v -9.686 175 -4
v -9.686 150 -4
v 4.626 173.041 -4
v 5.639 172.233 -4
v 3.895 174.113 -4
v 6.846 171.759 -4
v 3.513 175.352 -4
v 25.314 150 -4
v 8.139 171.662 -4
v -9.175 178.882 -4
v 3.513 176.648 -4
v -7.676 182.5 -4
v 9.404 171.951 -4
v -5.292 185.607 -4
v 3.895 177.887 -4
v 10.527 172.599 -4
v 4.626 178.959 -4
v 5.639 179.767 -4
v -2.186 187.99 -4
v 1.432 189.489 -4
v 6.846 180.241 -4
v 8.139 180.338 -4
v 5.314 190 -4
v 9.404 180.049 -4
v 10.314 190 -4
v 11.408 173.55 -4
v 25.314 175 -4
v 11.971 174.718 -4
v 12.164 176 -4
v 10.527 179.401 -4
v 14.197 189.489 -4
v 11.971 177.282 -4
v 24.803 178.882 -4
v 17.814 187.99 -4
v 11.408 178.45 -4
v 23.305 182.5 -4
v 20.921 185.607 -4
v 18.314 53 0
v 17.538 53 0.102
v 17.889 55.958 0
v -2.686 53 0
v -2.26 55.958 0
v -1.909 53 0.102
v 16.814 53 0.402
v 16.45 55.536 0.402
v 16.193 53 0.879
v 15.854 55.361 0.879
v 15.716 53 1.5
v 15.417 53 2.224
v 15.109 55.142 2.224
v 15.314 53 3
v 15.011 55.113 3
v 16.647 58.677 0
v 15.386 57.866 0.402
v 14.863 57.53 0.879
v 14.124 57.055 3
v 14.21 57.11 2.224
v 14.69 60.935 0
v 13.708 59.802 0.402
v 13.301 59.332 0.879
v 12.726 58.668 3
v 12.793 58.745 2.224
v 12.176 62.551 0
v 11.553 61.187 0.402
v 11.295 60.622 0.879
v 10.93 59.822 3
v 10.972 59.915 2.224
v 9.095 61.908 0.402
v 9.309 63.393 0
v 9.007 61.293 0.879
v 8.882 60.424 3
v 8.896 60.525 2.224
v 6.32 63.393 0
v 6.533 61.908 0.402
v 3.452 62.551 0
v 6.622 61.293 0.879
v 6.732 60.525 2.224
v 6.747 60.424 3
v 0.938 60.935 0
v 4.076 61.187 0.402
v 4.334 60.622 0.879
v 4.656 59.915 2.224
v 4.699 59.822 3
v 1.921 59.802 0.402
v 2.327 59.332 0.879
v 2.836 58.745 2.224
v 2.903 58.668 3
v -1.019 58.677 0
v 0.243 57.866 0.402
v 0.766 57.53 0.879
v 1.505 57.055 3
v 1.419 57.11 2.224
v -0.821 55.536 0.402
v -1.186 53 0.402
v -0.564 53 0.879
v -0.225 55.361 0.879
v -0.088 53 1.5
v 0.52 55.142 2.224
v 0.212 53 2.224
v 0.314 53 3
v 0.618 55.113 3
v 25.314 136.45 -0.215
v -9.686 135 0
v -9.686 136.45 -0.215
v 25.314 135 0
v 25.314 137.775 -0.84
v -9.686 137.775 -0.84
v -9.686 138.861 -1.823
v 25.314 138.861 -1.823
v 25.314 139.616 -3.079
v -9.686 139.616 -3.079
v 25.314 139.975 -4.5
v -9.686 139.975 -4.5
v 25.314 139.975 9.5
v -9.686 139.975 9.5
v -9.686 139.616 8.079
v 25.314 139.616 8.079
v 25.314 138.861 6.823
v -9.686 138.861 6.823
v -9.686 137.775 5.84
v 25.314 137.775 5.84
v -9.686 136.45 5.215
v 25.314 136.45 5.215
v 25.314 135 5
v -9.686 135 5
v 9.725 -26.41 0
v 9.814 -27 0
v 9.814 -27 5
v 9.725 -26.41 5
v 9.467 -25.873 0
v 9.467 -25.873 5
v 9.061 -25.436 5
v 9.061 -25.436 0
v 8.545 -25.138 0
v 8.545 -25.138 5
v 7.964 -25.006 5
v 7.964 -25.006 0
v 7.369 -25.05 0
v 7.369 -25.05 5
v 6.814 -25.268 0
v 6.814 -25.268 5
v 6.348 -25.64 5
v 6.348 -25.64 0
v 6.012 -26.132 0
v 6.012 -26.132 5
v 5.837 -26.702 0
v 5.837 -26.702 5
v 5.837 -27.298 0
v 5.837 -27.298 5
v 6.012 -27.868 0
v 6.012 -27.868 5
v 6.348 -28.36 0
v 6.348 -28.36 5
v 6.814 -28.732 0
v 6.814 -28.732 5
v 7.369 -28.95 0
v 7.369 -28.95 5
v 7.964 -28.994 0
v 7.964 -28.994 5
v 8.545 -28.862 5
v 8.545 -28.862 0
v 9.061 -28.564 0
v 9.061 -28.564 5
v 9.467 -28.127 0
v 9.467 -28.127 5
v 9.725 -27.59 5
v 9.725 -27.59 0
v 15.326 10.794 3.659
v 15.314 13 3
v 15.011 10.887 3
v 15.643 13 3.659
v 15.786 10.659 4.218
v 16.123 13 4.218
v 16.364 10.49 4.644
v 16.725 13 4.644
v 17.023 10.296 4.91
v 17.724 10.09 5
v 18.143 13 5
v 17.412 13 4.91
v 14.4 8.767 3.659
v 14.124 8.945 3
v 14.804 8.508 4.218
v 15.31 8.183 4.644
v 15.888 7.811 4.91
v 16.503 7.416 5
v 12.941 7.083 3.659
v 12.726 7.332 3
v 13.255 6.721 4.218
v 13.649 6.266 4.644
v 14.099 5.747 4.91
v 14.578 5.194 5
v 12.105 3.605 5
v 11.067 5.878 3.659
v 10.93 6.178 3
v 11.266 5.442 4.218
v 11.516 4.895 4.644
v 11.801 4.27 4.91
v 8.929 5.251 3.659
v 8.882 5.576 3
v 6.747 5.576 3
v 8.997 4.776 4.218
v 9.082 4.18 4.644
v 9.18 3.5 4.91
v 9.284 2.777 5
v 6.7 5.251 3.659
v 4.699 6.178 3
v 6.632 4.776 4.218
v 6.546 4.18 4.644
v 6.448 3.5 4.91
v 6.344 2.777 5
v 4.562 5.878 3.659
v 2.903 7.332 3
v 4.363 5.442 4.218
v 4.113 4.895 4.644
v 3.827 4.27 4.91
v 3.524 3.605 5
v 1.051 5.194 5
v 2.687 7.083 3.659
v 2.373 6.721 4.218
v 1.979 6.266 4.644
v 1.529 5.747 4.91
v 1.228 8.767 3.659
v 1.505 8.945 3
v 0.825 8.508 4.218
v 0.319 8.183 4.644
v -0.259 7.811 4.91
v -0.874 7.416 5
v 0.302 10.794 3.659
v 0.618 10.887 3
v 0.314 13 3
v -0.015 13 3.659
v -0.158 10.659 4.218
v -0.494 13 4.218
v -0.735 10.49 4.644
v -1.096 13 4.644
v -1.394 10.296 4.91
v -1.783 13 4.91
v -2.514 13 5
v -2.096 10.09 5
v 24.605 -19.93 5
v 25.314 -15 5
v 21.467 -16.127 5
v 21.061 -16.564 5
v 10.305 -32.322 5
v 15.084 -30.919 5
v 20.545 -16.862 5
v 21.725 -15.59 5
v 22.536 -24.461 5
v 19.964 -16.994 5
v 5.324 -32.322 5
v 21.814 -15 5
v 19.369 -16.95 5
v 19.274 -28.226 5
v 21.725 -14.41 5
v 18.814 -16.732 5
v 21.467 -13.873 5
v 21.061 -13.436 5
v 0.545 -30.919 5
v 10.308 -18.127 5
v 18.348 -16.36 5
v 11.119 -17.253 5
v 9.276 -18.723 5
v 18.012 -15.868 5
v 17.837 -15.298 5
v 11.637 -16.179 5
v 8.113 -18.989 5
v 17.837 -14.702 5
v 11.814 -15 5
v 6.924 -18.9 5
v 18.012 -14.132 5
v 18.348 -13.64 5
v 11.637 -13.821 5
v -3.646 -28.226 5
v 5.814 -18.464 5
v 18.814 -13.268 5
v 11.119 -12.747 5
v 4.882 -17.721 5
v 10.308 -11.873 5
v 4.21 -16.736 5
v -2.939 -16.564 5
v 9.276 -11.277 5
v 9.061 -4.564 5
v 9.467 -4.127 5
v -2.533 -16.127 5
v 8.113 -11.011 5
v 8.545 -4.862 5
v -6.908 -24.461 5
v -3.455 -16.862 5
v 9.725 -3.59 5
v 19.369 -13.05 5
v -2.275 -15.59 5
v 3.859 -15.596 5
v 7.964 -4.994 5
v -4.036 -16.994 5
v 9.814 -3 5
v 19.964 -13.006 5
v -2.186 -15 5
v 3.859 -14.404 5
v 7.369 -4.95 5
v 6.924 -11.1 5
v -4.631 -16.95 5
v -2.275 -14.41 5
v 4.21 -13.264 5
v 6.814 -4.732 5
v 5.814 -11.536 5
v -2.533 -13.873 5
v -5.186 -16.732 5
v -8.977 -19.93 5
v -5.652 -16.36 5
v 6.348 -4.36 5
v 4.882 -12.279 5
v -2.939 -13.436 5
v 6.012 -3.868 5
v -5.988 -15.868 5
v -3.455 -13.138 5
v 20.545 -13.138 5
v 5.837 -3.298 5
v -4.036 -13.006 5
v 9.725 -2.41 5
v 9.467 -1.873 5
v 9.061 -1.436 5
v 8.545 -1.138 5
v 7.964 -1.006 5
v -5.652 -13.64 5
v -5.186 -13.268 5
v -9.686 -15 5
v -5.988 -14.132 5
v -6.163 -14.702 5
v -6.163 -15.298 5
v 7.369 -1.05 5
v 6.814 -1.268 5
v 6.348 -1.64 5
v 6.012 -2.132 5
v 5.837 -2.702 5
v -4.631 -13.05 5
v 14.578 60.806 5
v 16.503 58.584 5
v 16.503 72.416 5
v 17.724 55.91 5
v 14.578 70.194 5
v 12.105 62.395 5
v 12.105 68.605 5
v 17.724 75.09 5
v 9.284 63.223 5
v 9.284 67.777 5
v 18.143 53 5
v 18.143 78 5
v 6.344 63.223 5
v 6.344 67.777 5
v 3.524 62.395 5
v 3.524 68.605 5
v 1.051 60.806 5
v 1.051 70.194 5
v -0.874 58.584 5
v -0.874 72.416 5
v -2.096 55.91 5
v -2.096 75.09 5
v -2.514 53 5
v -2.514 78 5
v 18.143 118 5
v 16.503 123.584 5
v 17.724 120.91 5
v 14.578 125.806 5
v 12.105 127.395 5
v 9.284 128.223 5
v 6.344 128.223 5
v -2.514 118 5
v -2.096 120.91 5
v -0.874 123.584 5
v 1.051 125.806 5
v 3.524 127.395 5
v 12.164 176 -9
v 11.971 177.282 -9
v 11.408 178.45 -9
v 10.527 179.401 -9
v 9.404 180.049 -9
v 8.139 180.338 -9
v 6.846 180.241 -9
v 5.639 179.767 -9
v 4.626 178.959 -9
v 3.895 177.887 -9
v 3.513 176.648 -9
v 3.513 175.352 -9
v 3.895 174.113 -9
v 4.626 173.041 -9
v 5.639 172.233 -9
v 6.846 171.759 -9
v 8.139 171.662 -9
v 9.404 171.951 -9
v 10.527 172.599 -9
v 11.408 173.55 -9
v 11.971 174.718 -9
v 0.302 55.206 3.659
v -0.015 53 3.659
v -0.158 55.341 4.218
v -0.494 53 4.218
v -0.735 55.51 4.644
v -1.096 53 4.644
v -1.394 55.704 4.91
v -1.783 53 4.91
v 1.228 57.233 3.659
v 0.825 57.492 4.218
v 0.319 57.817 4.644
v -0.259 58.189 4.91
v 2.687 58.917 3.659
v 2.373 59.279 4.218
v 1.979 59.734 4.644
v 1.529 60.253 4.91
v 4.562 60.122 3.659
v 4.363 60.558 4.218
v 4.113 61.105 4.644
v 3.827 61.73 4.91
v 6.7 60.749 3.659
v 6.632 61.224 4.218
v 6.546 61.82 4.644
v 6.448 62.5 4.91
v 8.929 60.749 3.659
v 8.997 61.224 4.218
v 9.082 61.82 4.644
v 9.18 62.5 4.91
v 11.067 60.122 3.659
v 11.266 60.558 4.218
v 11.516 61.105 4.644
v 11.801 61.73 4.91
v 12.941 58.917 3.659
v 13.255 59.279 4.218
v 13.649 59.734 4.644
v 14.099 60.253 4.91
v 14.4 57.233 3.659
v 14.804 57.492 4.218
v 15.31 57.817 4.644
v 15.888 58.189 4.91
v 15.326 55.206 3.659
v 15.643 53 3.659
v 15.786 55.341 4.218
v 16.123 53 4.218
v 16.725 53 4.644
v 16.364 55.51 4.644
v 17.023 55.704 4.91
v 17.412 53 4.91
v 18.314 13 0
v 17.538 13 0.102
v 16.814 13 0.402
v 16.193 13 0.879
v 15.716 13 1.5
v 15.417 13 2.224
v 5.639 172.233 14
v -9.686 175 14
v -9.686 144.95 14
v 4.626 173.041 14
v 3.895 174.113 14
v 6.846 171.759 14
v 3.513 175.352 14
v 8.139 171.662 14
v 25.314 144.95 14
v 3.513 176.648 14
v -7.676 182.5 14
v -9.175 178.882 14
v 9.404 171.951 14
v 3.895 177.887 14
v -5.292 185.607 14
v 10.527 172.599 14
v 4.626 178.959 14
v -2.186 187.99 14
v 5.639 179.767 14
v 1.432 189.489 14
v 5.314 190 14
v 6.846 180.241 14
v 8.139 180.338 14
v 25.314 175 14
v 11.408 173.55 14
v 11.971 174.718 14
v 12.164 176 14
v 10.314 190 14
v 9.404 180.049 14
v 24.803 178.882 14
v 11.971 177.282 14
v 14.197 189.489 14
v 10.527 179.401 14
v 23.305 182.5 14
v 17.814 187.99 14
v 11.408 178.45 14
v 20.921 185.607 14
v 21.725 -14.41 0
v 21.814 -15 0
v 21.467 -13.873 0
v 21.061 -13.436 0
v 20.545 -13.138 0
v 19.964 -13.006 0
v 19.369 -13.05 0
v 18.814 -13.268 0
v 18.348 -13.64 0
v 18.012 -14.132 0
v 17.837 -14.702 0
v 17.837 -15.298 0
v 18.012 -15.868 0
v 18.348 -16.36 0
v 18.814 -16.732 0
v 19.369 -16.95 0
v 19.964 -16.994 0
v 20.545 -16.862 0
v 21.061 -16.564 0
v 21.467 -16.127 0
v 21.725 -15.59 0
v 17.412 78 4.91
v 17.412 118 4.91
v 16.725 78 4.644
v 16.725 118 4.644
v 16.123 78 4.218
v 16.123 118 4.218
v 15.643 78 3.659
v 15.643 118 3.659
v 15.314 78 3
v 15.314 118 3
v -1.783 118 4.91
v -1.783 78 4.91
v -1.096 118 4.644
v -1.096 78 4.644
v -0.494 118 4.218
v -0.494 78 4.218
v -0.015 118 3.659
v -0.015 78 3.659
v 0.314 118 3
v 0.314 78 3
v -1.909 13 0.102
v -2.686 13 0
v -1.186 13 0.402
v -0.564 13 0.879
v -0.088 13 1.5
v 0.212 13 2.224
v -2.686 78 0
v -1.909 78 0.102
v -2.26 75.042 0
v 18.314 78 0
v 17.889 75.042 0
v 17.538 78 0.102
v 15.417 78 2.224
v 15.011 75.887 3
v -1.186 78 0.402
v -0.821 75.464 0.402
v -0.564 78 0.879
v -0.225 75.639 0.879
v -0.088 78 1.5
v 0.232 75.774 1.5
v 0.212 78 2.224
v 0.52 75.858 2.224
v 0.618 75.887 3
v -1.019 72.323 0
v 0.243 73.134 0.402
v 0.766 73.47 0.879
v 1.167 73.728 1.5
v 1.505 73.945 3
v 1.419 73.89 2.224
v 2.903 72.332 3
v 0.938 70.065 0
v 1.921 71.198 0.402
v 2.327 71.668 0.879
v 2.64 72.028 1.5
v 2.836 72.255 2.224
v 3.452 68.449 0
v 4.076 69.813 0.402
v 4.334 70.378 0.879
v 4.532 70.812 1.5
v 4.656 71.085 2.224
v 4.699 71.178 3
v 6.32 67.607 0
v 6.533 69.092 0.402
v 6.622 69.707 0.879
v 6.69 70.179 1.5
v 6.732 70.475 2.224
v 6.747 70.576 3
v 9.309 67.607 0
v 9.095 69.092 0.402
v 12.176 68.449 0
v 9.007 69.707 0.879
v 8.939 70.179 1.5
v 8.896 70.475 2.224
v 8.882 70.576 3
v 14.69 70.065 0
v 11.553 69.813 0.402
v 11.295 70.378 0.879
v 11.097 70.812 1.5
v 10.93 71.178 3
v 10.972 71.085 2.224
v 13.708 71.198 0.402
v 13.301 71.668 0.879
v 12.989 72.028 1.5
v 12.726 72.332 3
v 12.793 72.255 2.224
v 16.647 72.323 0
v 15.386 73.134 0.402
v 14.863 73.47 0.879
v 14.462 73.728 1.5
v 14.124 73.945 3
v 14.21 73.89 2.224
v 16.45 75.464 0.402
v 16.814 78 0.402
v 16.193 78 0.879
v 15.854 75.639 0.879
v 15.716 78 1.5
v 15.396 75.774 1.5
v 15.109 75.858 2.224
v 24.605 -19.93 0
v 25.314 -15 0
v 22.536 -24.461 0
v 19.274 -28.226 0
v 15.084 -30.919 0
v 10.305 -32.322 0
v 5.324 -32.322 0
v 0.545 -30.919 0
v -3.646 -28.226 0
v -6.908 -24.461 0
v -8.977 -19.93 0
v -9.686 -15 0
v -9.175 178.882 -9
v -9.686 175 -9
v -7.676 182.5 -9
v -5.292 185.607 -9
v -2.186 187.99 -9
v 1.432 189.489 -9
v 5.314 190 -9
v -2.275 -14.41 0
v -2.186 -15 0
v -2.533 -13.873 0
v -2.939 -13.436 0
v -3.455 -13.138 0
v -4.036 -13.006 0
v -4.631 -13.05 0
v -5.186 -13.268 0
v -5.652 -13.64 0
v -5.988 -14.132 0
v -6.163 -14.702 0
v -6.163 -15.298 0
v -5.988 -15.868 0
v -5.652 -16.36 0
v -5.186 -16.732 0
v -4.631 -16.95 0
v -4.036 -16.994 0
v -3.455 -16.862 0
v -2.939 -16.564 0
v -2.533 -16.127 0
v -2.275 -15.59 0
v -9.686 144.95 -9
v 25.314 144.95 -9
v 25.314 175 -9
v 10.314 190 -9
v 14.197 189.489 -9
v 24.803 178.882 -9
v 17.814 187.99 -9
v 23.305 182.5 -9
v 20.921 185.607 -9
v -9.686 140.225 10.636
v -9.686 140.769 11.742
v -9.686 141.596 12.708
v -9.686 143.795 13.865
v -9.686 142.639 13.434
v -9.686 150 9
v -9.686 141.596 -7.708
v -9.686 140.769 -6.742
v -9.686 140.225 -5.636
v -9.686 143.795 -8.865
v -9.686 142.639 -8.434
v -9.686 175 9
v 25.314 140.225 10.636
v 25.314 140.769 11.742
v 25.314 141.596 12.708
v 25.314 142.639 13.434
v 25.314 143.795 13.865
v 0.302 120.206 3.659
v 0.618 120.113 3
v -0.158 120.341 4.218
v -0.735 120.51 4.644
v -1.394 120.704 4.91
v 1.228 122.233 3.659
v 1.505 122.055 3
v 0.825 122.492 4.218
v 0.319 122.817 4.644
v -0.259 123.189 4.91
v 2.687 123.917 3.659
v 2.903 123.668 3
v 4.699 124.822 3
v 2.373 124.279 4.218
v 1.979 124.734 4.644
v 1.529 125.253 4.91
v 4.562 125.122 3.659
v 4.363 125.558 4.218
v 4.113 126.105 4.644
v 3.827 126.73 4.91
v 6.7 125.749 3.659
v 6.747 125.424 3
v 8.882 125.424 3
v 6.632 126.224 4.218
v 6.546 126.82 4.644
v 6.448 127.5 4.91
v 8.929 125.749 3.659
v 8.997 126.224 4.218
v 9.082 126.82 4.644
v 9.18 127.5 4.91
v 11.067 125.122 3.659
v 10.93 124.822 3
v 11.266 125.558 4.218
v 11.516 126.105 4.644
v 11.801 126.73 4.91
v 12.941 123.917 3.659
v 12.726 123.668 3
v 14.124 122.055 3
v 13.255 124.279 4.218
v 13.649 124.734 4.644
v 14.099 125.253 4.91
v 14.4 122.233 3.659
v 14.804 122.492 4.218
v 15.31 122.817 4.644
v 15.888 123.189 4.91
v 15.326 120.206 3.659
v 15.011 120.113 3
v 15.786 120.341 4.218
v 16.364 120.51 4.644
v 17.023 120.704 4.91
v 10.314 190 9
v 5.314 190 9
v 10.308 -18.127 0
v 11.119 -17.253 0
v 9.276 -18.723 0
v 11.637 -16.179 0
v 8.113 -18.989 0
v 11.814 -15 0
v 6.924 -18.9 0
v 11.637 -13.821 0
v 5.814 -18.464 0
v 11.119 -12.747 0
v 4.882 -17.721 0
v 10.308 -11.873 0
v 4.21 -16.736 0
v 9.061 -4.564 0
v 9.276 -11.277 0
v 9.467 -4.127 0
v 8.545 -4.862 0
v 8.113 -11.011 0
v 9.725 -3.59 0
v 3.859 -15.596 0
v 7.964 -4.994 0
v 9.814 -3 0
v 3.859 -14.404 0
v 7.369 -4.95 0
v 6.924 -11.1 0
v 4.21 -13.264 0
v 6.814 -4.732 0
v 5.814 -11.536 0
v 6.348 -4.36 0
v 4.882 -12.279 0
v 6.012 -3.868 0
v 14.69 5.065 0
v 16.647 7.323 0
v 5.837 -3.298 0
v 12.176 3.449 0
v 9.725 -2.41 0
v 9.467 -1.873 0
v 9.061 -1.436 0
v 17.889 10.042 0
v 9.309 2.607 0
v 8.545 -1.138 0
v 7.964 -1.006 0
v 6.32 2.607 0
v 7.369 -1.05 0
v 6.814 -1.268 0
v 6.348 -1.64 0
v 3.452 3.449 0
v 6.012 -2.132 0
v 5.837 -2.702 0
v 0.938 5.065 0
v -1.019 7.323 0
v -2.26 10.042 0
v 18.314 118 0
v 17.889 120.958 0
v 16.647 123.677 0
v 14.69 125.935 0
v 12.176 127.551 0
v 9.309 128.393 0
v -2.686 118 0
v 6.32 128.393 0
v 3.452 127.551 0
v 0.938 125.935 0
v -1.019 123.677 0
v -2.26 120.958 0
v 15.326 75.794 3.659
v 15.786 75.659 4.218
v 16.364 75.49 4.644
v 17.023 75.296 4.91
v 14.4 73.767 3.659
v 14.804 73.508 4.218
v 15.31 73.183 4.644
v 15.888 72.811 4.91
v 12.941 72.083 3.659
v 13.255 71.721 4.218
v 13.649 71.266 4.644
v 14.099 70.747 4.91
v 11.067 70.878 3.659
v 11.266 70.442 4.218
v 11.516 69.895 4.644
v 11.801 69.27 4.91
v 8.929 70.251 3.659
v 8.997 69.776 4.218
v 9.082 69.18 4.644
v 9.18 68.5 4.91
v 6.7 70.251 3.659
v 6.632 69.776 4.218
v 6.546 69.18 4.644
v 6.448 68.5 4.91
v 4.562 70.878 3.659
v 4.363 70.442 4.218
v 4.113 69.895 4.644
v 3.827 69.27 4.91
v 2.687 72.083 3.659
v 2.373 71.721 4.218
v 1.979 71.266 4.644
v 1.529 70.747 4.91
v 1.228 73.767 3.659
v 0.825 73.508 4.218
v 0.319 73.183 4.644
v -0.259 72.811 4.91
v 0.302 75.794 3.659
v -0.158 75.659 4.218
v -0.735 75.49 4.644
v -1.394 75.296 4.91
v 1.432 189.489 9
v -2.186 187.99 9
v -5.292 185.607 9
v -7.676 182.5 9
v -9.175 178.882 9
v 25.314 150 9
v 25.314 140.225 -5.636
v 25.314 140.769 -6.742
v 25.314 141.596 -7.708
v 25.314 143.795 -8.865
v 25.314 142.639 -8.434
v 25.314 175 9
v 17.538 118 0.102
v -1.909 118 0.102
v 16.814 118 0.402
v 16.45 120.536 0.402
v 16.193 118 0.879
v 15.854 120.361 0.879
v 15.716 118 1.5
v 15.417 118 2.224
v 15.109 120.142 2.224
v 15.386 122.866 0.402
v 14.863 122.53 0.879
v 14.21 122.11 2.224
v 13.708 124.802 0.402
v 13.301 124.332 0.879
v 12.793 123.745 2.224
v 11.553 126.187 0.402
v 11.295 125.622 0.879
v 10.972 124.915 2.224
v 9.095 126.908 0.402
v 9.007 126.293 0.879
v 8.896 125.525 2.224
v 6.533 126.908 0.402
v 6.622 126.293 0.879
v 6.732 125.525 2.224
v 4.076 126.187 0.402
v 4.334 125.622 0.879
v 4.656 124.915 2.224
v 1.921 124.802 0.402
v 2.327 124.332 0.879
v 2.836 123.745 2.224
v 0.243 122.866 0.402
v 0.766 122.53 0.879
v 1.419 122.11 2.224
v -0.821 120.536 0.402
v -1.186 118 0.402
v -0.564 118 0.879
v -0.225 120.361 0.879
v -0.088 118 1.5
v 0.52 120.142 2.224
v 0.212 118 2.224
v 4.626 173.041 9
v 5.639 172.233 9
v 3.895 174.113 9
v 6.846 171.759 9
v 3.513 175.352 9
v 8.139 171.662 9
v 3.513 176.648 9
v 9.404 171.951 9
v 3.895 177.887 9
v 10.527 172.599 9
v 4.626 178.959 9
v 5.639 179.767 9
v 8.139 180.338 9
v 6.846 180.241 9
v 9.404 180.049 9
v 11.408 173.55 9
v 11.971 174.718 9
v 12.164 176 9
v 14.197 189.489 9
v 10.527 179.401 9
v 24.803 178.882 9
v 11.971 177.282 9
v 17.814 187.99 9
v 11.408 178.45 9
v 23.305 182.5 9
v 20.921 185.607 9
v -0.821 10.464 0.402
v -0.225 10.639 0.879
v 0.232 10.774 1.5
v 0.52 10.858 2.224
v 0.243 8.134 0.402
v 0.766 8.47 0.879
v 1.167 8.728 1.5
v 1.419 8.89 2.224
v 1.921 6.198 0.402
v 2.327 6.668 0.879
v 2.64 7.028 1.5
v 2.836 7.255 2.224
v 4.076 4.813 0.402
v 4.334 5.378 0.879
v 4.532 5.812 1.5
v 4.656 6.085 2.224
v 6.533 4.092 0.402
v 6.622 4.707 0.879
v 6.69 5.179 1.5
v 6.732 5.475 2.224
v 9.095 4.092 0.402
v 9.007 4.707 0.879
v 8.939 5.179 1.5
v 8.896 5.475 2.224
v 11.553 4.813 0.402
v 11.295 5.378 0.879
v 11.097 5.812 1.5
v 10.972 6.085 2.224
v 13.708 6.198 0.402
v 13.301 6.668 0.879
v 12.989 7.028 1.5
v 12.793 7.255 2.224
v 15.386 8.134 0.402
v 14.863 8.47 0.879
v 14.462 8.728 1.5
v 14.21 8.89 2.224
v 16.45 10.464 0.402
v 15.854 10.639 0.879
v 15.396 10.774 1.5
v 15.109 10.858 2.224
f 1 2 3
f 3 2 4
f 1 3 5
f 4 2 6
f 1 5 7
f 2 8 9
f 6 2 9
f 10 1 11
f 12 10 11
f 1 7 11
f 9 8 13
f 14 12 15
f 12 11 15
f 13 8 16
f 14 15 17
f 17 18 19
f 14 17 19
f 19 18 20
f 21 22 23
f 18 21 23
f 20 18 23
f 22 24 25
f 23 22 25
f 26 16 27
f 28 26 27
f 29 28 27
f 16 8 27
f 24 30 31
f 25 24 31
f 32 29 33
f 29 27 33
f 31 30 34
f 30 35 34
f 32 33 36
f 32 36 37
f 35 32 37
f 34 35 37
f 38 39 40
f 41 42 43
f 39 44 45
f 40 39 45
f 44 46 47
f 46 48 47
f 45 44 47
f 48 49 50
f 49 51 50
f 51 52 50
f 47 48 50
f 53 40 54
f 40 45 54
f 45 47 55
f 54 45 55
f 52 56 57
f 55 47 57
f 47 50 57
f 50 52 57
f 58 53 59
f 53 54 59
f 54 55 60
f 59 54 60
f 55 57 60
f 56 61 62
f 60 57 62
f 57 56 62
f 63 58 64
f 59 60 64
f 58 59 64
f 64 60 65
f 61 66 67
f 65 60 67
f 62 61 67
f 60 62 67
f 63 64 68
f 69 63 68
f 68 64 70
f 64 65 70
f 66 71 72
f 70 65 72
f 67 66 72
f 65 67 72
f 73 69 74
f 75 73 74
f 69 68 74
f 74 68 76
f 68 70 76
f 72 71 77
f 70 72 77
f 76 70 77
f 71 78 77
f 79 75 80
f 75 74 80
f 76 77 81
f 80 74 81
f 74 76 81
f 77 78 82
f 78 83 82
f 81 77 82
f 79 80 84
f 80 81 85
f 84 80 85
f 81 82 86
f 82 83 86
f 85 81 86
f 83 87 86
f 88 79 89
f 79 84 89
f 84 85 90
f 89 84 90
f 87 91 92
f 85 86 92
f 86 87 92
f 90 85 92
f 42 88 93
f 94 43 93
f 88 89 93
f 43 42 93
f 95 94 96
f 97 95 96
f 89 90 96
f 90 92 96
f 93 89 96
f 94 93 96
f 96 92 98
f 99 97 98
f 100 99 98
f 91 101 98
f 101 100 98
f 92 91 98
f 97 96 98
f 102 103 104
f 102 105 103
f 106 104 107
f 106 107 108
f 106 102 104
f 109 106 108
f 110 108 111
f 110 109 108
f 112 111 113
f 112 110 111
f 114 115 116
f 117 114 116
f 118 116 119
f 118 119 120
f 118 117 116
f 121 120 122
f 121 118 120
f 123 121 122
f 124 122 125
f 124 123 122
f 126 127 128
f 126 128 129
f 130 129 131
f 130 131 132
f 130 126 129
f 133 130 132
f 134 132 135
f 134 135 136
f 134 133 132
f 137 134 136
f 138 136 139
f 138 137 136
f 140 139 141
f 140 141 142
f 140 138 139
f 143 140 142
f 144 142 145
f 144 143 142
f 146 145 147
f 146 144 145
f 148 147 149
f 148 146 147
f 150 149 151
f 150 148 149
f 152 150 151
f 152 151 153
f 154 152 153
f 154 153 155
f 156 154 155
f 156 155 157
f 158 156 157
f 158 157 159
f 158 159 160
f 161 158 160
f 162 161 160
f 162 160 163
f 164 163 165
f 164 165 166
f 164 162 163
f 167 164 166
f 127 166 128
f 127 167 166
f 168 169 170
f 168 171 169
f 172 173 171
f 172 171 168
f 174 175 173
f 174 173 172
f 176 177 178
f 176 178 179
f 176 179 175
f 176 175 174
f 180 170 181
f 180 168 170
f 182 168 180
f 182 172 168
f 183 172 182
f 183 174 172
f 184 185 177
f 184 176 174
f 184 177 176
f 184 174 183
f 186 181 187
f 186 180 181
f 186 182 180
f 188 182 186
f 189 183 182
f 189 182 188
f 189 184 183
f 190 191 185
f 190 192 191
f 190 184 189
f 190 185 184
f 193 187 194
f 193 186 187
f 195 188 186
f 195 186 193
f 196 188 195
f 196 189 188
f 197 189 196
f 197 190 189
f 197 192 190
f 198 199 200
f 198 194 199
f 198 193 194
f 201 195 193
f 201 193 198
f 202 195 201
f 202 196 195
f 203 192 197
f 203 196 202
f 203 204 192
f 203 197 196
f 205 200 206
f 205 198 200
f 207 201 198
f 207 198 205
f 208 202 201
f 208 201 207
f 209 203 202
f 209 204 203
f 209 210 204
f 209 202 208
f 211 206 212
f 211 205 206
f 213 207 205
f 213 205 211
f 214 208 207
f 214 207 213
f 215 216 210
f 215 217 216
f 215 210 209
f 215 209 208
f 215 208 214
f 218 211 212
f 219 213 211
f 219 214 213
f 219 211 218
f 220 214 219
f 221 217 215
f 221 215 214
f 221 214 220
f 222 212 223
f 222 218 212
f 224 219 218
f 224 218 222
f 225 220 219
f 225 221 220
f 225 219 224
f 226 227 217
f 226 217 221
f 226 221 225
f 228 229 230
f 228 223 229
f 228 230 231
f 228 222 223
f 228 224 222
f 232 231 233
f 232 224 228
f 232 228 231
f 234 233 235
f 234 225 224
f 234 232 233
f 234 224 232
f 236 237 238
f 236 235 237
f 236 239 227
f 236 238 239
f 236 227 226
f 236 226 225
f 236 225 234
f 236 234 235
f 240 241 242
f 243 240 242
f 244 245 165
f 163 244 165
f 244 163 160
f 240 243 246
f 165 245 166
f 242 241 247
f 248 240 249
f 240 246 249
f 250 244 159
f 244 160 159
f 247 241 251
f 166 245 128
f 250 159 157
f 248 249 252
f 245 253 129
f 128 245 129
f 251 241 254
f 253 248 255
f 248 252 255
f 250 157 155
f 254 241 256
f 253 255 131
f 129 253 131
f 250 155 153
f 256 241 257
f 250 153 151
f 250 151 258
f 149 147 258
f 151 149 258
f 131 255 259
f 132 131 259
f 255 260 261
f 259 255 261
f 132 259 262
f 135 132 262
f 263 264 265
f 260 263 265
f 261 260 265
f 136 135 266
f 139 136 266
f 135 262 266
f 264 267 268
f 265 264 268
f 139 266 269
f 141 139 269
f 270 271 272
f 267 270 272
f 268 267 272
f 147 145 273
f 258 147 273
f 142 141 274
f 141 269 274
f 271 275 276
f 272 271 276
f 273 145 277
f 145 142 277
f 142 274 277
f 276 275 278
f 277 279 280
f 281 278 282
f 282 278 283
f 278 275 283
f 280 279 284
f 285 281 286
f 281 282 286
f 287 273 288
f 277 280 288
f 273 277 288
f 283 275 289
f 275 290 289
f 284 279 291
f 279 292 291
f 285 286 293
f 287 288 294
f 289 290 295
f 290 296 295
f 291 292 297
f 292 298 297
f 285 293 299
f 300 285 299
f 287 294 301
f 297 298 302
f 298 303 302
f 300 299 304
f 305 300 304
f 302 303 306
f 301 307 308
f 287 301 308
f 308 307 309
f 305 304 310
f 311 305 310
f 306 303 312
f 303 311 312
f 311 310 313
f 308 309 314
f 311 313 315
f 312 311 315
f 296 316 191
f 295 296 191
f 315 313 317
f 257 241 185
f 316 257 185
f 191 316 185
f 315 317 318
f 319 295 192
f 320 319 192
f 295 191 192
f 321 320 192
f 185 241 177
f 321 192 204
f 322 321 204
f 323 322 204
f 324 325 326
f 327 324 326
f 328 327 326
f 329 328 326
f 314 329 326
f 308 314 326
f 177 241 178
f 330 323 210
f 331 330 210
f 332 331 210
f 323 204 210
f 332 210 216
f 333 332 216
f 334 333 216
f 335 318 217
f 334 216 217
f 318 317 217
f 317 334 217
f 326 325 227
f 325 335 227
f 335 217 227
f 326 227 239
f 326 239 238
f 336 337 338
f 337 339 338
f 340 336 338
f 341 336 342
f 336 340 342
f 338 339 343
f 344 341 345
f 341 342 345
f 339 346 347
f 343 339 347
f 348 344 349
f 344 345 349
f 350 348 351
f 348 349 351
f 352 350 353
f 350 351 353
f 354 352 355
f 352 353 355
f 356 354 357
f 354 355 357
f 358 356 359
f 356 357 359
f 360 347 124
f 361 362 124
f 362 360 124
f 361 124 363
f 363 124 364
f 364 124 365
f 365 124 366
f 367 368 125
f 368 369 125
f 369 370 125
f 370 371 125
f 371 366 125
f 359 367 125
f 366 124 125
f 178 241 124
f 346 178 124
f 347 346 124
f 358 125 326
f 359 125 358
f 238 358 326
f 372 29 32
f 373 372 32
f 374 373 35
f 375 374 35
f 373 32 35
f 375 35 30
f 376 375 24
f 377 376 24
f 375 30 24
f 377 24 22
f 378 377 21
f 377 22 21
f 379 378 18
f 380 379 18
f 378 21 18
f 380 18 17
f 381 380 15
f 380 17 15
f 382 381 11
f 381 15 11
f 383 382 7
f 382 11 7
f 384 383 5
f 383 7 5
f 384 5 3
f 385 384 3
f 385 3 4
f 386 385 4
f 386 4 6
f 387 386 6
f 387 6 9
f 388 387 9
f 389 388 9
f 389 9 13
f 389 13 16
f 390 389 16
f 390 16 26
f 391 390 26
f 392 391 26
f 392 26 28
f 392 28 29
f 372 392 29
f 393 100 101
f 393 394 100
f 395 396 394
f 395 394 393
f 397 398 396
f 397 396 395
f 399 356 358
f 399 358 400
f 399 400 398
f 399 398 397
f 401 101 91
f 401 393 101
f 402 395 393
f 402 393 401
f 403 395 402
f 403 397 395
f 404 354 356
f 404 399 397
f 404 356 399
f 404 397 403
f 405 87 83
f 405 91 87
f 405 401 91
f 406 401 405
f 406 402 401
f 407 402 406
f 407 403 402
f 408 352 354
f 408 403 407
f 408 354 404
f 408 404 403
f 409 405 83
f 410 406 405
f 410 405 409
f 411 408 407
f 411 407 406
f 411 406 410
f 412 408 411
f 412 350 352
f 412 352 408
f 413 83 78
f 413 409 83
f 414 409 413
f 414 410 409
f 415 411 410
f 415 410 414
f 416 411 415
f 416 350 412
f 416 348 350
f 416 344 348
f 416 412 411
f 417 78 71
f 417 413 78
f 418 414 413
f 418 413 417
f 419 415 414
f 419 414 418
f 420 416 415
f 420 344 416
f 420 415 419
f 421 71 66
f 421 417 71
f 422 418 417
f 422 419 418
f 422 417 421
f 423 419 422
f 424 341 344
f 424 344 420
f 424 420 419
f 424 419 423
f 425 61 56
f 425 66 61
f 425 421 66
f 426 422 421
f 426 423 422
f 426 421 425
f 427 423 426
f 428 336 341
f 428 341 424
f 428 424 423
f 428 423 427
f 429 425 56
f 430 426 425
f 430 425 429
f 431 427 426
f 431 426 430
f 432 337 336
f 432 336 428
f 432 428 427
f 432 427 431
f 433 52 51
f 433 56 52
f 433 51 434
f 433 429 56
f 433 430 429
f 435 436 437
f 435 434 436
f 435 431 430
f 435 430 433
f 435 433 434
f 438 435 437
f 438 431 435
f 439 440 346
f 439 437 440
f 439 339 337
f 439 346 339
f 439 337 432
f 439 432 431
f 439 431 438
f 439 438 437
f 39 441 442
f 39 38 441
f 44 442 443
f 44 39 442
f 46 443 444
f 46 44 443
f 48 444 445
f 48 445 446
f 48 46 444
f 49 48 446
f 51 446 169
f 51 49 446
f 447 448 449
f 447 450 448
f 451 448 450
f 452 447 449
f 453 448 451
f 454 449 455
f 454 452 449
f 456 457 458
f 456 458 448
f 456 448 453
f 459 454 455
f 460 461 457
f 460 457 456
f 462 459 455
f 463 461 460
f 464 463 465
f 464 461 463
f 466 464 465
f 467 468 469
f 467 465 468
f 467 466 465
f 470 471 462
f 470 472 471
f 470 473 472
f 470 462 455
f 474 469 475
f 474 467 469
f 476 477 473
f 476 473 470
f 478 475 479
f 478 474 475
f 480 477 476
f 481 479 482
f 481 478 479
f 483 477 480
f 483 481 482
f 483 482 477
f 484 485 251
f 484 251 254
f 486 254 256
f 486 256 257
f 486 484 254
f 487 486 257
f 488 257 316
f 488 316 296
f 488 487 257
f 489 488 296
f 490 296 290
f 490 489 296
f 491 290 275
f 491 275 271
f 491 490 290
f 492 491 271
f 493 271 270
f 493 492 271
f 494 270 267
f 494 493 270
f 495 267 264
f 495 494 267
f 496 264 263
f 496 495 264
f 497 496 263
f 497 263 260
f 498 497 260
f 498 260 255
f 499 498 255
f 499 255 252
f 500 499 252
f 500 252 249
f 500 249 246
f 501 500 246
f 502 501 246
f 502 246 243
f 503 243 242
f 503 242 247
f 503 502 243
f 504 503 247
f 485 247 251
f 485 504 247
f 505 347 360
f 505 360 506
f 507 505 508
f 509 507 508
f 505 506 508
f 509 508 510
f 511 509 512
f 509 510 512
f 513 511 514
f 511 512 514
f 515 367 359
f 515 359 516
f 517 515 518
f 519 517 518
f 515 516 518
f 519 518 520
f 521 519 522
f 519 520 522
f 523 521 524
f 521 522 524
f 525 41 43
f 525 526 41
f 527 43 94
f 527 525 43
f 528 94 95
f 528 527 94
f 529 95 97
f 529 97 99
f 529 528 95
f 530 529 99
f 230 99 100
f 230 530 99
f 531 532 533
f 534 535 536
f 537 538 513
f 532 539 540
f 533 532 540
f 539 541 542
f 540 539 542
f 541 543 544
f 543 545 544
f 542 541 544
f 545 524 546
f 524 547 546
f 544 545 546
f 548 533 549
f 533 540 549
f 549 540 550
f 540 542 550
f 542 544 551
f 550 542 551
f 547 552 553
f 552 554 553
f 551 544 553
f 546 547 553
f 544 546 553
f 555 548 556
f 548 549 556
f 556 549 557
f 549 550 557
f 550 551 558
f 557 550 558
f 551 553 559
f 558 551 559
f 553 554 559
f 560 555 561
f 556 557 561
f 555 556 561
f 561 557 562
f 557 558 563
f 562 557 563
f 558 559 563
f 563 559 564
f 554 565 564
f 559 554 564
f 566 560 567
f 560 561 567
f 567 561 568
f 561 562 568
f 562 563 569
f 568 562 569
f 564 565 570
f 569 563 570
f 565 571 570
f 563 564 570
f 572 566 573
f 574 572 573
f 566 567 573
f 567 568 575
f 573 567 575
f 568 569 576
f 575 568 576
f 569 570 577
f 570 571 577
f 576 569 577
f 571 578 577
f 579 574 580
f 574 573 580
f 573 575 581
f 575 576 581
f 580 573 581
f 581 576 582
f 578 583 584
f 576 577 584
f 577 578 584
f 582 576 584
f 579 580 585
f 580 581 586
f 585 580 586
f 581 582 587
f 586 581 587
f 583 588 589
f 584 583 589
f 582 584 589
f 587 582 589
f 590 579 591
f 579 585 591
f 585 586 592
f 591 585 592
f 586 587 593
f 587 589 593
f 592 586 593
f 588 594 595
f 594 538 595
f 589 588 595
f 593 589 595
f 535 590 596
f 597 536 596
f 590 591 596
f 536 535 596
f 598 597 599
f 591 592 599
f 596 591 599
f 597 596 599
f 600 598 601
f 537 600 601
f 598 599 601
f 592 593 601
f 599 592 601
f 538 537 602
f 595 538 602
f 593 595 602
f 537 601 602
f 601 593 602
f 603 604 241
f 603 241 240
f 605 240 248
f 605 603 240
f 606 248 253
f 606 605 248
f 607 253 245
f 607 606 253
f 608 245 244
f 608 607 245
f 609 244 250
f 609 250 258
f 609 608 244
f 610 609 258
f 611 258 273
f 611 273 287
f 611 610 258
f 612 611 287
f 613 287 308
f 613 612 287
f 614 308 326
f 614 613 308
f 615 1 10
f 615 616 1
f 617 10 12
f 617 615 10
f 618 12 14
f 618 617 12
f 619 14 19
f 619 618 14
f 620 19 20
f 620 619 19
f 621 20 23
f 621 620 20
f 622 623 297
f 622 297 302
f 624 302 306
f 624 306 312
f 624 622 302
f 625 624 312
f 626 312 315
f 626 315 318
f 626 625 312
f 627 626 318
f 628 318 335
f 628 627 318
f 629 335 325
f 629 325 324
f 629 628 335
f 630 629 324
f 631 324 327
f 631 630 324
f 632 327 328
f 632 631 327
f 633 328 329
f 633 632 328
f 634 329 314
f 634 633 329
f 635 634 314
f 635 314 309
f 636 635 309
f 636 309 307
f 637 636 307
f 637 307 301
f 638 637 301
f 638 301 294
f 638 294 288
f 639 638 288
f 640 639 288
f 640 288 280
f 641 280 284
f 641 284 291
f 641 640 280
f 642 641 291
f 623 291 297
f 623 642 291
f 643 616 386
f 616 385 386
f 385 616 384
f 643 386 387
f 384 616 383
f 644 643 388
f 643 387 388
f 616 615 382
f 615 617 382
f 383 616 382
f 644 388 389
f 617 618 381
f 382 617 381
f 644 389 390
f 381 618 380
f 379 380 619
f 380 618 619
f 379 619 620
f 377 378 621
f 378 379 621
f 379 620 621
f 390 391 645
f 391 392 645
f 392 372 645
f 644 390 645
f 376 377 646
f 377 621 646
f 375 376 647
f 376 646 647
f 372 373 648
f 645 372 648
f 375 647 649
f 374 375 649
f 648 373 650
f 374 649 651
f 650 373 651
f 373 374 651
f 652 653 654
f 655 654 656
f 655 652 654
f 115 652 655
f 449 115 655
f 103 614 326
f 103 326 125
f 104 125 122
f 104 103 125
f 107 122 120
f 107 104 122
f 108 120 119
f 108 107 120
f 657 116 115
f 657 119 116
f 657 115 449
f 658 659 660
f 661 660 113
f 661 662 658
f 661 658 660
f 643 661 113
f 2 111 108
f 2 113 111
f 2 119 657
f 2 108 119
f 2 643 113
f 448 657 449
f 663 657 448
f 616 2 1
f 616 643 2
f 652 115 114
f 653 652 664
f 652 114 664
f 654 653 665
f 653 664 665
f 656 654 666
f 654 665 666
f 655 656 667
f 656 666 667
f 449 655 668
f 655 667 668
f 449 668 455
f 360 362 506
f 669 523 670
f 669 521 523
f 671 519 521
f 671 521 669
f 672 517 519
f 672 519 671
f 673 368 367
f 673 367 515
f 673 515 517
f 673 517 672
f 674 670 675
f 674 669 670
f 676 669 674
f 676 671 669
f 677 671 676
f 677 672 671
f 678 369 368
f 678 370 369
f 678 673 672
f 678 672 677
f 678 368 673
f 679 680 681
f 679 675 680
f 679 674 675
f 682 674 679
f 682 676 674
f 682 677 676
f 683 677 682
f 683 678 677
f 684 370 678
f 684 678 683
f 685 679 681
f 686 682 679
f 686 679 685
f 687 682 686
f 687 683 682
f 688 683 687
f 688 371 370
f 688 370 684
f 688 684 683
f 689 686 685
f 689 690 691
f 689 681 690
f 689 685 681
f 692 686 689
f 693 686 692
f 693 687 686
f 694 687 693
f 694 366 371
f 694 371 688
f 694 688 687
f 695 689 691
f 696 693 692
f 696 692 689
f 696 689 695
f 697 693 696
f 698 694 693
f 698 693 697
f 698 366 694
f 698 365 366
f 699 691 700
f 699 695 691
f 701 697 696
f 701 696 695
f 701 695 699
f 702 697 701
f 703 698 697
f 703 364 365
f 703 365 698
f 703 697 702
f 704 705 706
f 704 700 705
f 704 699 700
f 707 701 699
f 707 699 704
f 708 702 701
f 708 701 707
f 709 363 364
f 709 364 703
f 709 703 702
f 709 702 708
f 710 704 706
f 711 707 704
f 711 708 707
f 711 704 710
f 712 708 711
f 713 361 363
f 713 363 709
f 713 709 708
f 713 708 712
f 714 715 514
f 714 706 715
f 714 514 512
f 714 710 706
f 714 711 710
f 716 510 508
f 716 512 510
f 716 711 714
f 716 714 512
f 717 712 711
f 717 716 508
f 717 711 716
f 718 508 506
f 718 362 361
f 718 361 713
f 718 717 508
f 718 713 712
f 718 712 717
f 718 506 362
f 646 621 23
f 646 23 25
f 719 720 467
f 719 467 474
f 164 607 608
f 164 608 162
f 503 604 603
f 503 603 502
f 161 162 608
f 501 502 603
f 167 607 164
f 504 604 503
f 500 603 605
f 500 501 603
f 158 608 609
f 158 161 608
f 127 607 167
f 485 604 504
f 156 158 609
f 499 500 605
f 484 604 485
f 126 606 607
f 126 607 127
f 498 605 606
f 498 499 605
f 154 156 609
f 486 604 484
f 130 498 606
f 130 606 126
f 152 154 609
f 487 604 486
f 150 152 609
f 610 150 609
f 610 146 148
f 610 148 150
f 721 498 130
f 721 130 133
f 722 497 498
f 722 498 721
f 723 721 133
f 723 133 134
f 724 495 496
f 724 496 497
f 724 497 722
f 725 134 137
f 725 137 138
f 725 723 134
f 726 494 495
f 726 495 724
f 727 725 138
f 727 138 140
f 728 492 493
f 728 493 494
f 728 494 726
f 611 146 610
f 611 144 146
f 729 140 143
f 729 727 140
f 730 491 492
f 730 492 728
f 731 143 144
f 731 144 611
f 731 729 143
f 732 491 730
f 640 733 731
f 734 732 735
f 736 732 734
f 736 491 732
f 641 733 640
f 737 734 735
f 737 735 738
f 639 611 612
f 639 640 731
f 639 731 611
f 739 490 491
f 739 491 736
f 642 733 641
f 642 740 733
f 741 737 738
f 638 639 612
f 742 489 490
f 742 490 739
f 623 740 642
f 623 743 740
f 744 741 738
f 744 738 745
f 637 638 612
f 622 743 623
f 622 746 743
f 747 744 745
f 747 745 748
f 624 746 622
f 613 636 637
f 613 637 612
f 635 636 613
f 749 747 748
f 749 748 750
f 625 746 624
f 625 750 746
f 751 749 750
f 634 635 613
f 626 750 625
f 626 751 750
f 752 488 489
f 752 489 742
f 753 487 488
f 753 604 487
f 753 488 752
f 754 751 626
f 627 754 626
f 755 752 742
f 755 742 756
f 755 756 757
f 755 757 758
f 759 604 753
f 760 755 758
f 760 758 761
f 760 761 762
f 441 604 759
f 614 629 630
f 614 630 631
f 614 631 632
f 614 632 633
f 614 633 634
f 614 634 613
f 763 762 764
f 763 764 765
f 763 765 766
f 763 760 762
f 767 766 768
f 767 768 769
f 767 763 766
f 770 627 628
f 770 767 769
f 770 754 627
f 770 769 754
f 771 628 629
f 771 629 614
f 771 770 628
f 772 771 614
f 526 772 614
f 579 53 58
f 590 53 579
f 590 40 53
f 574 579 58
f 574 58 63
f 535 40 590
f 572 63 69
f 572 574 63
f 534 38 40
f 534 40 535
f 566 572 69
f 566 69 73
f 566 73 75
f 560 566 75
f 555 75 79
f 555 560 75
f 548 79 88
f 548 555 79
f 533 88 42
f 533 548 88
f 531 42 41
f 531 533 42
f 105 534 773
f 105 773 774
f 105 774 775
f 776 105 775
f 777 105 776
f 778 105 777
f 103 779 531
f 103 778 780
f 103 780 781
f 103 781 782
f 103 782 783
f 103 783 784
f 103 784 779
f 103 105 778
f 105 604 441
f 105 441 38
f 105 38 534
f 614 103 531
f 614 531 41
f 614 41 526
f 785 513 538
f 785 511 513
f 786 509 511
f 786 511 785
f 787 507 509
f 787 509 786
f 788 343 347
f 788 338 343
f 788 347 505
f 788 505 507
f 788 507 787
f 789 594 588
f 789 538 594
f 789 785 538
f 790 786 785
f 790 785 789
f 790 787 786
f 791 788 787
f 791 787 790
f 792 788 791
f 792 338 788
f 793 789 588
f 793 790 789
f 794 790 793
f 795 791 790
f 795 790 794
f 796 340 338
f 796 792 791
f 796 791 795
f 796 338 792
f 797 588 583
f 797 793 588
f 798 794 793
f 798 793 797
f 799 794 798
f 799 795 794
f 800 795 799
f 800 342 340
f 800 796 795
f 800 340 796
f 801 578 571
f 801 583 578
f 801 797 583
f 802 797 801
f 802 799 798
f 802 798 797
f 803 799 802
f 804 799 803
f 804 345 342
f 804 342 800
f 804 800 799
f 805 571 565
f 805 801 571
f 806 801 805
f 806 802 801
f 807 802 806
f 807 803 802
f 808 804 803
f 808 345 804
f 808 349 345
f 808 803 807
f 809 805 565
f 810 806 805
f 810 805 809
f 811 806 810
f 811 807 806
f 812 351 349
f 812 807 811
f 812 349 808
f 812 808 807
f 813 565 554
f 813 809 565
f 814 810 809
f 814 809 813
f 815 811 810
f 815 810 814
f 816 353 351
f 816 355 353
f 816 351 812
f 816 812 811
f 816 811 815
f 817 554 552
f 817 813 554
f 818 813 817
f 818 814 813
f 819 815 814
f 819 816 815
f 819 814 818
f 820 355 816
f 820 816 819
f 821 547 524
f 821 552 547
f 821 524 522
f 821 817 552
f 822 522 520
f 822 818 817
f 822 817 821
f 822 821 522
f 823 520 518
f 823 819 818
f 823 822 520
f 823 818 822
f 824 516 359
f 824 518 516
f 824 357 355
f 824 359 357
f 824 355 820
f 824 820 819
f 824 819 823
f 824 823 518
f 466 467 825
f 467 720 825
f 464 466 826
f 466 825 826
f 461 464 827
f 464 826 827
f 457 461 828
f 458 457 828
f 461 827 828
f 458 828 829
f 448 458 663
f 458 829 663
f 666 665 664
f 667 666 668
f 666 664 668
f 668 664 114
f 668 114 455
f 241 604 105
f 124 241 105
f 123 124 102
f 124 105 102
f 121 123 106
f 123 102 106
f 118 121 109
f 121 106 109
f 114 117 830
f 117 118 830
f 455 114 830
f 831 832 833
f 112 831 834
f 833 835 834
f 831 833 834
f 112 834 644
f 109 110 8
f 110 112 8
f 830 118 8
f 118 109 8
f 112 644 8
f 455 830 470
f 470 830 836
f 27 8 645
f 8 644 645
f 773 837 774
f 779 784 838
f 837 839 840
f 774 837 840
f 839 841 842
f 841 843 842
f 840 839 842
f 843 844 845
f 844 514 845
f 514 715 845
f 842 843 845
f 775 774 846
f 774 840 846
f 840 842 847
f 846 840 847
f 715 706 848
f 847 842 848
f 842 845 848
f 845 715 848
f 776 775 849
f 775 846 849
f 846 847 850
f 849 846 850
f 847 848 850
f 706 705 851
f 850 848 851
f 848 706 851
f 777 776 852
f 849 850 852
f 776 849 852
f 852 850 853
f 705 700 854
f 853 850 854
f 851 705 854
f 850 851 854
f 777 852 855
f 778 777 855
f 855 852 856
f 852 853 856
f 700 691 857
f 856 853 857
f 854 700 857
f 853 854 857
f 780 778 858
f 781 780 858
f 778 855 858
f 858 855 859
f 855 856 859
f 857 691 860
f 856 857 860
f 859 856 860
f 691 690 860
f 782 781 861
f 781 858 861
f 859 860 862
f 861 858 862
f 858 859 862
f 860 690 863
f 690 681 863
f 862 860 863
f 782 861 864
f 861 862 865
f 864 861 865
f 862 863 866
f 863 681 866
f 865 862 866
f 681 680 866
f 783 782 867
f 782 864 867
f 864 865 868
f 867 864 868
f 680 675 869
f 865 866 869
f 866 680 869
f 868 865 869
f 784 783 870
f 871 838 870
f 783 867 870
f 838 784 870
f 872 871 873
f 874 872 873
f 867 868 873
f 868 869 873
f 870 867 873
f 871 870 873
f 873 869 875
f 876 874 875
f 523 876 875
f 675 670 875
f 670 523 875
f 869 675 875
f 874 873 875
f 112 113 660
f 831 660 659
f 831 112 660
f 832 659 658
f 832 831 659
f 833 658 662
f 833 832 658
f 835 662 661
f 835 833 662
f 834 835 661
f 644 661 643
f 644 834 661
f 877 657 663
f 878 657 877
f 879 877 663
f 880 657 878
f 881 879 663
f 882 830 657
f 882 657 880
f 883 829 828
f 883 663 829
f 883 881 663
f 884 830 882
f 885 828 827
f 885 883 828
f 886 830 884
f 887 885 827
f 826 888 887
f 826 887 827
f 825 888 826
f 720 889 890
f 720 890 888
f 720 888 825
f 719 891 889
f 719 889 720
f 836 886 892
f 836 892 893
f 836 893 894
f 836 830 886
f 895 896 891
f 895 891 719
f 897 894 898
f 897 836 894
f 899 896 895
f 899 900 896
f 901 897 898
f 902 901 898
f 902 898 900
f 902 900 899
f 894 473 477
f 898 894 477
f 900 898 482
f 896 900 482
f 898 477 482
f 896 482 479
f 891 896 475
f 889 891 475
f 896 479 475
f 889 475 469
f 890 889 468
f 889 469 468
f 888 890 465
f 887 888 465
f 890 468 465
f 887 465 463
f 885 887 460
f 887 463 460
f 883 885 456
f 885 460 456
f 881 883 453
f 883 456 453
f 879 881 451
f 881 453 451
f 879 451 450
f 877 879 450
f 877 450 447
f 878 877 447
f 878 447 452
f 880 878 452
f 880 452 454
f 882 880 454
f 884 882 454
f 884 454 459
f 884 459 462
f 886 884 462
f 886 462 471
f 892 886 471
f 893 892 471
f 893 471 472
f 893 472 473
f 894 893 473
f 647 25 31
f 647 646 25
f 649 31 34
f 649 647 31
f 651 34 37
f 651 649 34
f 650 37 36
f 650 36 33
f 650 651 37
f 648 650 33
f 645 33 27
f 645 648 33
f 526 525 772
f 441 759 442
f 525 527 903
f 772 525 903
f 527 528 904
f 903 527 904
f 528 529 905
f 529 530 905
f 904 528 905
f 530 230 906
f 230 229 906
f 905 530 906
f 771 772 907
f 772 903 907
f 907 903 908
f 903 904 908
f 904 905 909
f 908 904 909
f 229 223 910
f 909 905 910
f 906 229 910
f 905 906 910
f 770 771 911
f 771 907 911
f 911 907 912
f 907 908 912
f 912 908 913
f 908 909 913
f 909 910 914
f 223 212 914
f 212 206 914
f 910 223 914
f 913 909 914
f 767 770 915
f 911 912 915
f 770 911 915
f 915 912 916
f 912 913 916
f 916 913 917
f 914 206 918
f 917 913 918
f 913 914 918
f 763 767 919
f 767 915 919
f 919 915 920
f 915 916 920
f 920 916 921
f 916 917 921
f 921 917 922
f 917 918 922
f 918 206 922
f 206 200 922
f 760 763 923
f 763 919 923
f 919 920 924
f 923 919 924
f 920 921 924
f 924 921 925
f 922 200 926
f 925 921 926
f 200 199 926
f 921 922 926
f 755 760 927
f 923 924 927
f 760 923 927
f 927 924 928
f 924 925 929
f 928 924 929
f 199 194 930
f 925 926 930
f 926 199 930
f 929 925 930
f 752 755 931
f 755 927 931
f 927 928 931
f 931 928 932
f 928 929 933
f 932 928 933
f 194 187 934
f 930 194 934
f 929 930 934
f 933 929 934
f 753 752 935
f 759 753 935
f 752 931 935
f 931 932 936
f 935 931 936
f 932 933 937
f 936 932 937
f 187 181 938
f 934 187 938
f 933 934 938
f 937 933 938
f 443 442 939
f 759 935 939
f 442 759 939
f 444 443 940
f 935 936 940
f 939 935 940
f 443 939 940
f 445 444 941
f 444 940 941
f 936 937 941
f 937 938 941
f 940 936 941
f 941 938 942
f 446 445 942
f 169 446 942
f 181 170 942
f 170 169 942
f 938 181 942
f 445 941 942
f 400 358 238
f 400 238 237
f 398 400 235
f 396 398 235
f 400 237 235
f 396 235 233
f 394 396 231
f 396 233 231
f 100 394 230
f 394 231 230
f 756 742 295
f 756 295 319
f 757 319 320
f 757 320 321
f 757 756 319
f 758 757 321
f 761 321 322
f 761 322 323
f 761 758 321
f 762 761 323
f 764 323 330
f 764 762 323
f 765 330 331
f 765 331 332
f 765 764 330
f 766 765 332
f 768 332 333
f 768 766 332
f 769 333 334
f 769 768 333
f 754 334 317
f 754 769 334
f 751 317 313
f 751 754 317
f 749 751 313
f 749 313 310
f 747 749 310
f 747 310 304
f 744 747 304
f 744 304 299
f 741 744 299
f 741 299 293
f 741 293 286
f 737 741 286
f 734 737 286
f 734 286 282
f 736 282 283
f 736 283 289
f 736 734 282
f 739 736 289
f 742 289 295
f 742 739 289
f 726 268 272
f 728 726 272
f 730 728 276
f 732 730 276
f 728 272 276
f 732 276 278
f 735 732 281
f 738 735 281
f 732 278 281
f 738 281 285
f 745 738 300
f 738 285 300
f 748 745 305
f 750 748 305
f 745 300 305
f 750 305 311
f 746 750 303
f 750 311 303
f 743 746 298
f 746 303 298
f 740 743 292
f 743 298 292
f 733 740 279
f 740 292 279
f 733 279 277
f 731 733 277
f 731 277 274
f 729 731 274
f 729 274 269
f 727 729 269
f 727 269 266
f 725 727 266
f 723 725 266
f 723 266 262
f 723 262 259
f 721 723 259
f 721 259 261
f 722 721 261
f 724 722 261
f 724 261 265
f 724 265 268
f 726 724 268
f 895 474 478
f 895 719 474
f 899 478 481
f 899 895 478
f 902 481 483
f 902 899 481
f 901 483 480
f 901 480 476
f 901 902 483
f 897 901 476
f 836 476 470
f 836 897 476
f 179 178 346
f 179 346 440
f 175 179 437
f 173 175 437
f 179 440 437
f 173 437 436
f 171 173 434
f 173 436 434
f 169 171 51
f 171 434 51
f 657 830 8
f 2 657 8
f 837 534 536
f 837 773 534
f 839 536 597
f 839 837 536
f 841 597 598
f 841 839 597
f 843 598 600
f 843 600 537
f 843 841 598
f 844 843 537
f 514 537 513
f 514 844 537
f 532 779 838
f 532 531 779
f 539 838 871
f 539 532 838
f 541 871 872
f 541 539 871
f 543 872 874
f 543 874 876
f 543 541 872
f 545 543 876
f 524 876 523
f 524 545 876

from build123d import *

# Parameters (mm, degrees)
SKETCH1_R                = 2
BOSS_EXTRUDE2_DEPTH      = 5
BOSS_EXTRUDE3_DEPTH      = 9
BOSS_EXTRUDE3_DEPTH_BACK = 14
SKETCH3_W                = 35
SKETCH3_H                = 50
SKETCH4_W                = 13
SKETCH4_H                = 40
CUT_EXTRUDE1_DEPTH       = 194.703381488
SKETCH5_R                = 4.35
CUT_EXTRUDE2_DEPTH       = 194.053917795
CUT_EXTRUDE3_DEPTH       = 193.189529309
FILLET14_R               = 15
FILLET15_R               = 15
FILLET16_R               = 15
FILLET17_R               = 15
FILLET18_R               = 5
FILLET19_R               = 5
FILLET20_R               = 5
FILLET21_R               = 5
FILLET22_R               = 3
FILLET23_R               = 3
FILLET24_R               = 3
FILLET25_R               = 3
SKETCH7_R                = 4
CUT_EXTRUDE4_DEPTH       = 193.189529428


with BuildPart() as part:
    # Sketch1 → Boss-Extrude2 (new body)
    with BuildSketch(Plane.XY):
        with BuildLine():
            Line((-9.685672515, -15), (-9.685672515, 190))
            Line((-9.685672515, 190), (25.314327485, 190))
            Line((25.314327485, 190), (25.314327485, -15))
            ThreePointArc((25.314327485, -15), (7.814327485, -32.5), (-9.685672515, -15))
        make_face()
        with Locations((19.814327485, -15)):
            Circle(SKETCH1_R, mode=Mode.SUBTRACT)
        with Locations((7.814327485, -27)):
            Circle(SKETCH1_R, mode=Mode.SUBTRACT)
        with Locations((-4.185672515, -15)):
            Circle(SKETCH1_R, mode=Mode.SUBTRACT)
        with Locations((7.814327485, -3)):
            Circle(SKETCH1_R, mode=Mode.SUBTRACT)
    extrude(amount=BOSS_EXTRUDE2_DEPTH)

    # Sketch3 → Boss-Extrude3 (add, two sides: drawn at the far end of the back side and taken through both)
    with BuildSketch(Plane.XY.offset(5).offset(-BOSS_EXTRUDE3_DEPTH_BACK)):
        with Locations((7.814327485, 165)):
            Rectangle(SKETCH3_W, SKETCH3_H)
    extrude(amount=BOSS_EXTRUDE3_DEPTH + BOSS_EXTRUDE3_DEPTH_BACK)

    # Sketch4 → Cut-Extrude1 (cut, through all)
    with BuildSketch(Plane(origin=(25.314327485, 0, 0), x_dir=(0, 0, -1), z_dir=(1, 0, 0))):
        with Locations((-2.5, 170)):
            Rectangle(SKETCH4_W, SKETCH4_H)
    extrude(amount=-CUT_EXTRUDE1_DEPTH, mode=Mode.SUBTRACT)

    # Sketch5 → Cut-Extrude2 (cut, through all)
    with BuildSketch(Plane.XY.offset(14)):
        with Locations((7.814327485, 176)):
            Circle(SKETCH5_R)
    extrude(amount=-CUT_EXTRUDE2_DEPTH, mode=Mode.SUBTRACT)

    # Sketch6 → Cut-Extrude3 (cut, through all)
    with BuildSketch(Plane.XY.offset(5)):
        with BuildLine():
            Line((15.314327485, 118), (15.314327485, 78))
            ThreePointArc((15.314327485, 78), (7.814327485, 70.5), (0.314327485, 78))
            Line((0.314327485, 78), (0.314327485, 118))
            ThreePointArc((0.314327485, 118), (7.814327485, 125.5), (15.314327485, 118))
        make_face()
        with BuildLine():
            Line((15.314327485, 53), (15.314327485, 13))
            ThreePointArc((15.314327485, 13), (7.814327485, 5.5), (0.314327485, 13))
            Line((0.314327485, 13), (0.314327485, 53))
            ThreePointArc((0.314327485, 53), (7.814327485, 60.5), (15.314327485, 53))
        make_face()
    extrude(amount=-CUT_EXTRUDE3_DEPTH, mode=Mode.SUBTRACT)

    # Fillet14
    fillet14_edges = [part.edges().sort_by_distance(p)[0] for p in [
        (25.314327485, 190, 11.5),
    ]]
    fillet(fillet14_edges, radius=FILLET14_R)

    # Fillet15
    fillet15_edges = [part.edges().sort_by_distance(p)[0] for p in [
        (-9.685672515, 190, 11.5),
    ]]
    fillet(fillet15_edges, radius=FILLET15_R)

    # Fillet16
    fillet16_edges = [part.edges().sort_by_distance(p)[0] for p in [
        (-9.685672515, 190, -6.5),
    ]]
    fillet(fillet16_edges, radius=FILLET16_R)

    # Fillet17
    fillet17_edges = [part.edges().sort_by_distance(p)[0] for p in [
        (25.314327485, 190, -6.5),
    ]]
    fillet(fillet17_edges, radius=FILLET17_R)

    # Fillet18
    fillet18_edges = [part.edges().sort_by_distance(p)[0] for p in [
        (7.814327485, 140, 5),
    ]]
    fillet(fillet18_edges, radius=FILLET18_R)

    # Fillet19
    fillet19_edges = [part.edges().sort_by_distance(p)[0] for p in [
        (7.814327485, 140, 0),
    ]]
    fillet(fillet19_edges, radius=FILLET19_R)

    # Fillet20
    fillet20_edges = [part.edges().sort_by_distance(p)[0] for p in [
        (7.814327485, 140, -9),
    ]]
    fillet(fillet20_edges, radius=FILLET20_R)

    # Fillet21
    fillet21_edges = [part.edges().sort_by_distance(p)[0] for p in [
        (7.814327485, 140, 14),
    ]]
    fillet(fillet21_edges, radius=FILLET21_R)

    # Fillet22
    fillet22_edges = [part.edges().sort_by_distance(p)[0] for p in [
        (0.314327485, 98, 0),
        (7.814327485, 70.5, 0),
        (15.314327485, 98, 0),
        (7.814327485, 125.5, 0),
    ]]
    fillet(fillet22_edges, radius=FILLET22_R)

    # Fillet23
    # the kernel refuses this fillet: 3 mm, written as the material it takes off along each edge
    with BuildSketch(Plane(origin=(15.314327485, 118, 5), x_dir=(0, 0, -1), z_dir=(0, -1, 0)), Plane(origin=(0.314327485, 78, 5), x_dir=(0, 0, -1), z_dir=(0, 1, 0))) as fillet23_piece_1:
        with BuildLine():
            CenterArc((3, 2.828427125), FILLET23_R, 180, 70.528779366)
            Line((0, 2.828427125), (-0.06, 2.828427125))
            Line((-0.06, 2.828427125), (-0.06, 0))
            Line((-0.06, 0), (0, -0.06))
            ThreePointArc((0, -0.06), (1, -0.06), (1.98, -0.056568542))
            Line((1.98, -0.056568542), (2, 0))
        make_face()
    extrude(amount=40, mode=Mode.SUBTRACT)
    with BuildSketch(Plane(origin=(7.814327485, 78, 5), x_dir=(1, 0, 0), z_dir=(0, 1, 0))) as fillet23_piece_2:
        with BuildLine():
            CenterArc((10.328427125, 3), FILLET23_R, 199.471220634, 70.528779366)
            Line((10.328427125, 0), (10.328427125, -0.06))
            Line((10.328427125, -0.06), (7.5, -0.06))
            Line((7.5, -0.06), (7.44, 0))
            ThreePointArc((7.44, 0), (7.44, 1), (7.443431458, 1.98))
            Line((7.443431458, 1.98), (7.5, 2))
        make_face()
    revolve(axis=Axis((7.814327485, 78, 5), (0, 0, -1)), revolution_arc=180, mode=Mode.SUBTRACT)
    with BuildSketch(Plane(origin=(7.814327485, 118, 5), x_dir=(-1, 0, 0), z_dir=(0, -1, 0))) as fillet23_piece_3:
        with BuildLine():
            CenterArc((10.328427125, 3), FILLET23_R, 199.471220634, 70.528779366)
            Line((10.328427125, 0), (10.328427125, -0.06))
            Line((10.328427125, -0.06), (7.5, -0.06))
            Line((7.5, -0.06), (7.44, 0))
            ThreePointArc((7.44, 0), (7.44, 1), (7.443431458, 1.98))
            Line((7.443431458, 1.98), (7.5, 2))
        make_face()
    revolve(axis=Axis((7.814327485, 118, 5), (0, 0, -1)), revolution_arc=180, mode=Mode.SUBTRACT)

    # Fillet24
    fillet24_edges = [part.edges().sort_by_distance(p)[0] for p in [
        (0.314327485, 33, 0),
        (7.814327485, 5.5, 0),
        (15.314327485, 33, 0),
        (7.814327485, 60.5, 0),
    ]]
    fillet(fillet24_edges, radius=FILLET24_R)

    # Fillet25
    # the kernel refuses this fillet: 3 mm, written as the material it takes off along each edge
    with BuildSketch(Plane(origin=(15.314327485, 53, 5), x_dir=(0, 0, -1), z_dir=(0, -1, 0)), Plane(origin=(0.314327485, 13, 5), x_dir=(0, 0, -1), z_dir=(0, 1, 0))) as fillet25_piece_1:
        with BuildLine():
            CenterArc((3, 2.828427125), FILLET25_R, 180, 70.528779366)
            Line((0, 2.828427125), (-0.06, 2.828427125))
            Line((-0.06, 2.828427125), (-0.06, 0))
            Line((-0.06, 0), (0, -0.06))
            ThreePointArc((0, -0.06), (1, -0.06), (1.98, -0.056568542))
            Line((1.98, -0.056568542), (2, 0))
        make_face()
    extrude(amount=40, mode=Mode.SUBTRACT)
    with BuildSketch(Plane(origin=(7.814327485, 13, 5), x_dir=(1, 0, 0), z_dir=(0, 1, 0))) as fillet25_piece_2:
        with BuildLine():
            CenterArc((10.328427125, 3), FILLET25_R, 199.471220634, 70.528779366)
            Line((10.328427125, 0), (10.328427125, -0.06))
            Line((10.328427125, -0.06), (7.5, -0.06))
            Line((7.5, -0.06), (7.44, 0))
            ThreePointArc((7.44, 0), (7.44, 1), (7.443431458, 1.98))
            Line((7.443431458, 1.98), (7.5, 2))
        make_face()
    revolve(axis=Axis((7.814327485, 13, 5), (0, 0, -1)), revolution_arc=180, mode=Mode.SUBTRACT)
    with BuildSketch(Plane(origin=(7.814327485, 53, 5), x_dir=(-1, 0, 0), z_dir=(0, -1, 0))) as fillet25_piece_3:
        with BuildLine():
            CenterArc((10.328427125, 3), FILLET25_R, 199.471220634, 70.528779366)
            Line((10.328427125, 0), (10.328427125, -0.06))
            Line((10.328427125, -0.06), (7.5, -0.06))
            Line((7.5, -0.06), (7.44, 0))
            ThreePointArc((7.44, 0), (7.44, 1), (7.443431458, 1.98))
            Line((7.443431458, 1.98), (7.5, 2))
        make_face()
    revolve(axis=Axis((7.814327485, 53, 5), (0, 0, -1)), revolution_arc=180, mode=Mode.SUBTRACT)

    # Sketch7 → Cut-Extrude4 (cut, through all)
    with BuildSketch(Plane.XY.offset(5)):
        with Locations((7.814327485, -15)):
            Circle(SKETCH7_R)
    extrude(amount=-CUT_EXTRUDE4_DEPTH, mode=Mode.SUBTRACT)


solid = part.part
